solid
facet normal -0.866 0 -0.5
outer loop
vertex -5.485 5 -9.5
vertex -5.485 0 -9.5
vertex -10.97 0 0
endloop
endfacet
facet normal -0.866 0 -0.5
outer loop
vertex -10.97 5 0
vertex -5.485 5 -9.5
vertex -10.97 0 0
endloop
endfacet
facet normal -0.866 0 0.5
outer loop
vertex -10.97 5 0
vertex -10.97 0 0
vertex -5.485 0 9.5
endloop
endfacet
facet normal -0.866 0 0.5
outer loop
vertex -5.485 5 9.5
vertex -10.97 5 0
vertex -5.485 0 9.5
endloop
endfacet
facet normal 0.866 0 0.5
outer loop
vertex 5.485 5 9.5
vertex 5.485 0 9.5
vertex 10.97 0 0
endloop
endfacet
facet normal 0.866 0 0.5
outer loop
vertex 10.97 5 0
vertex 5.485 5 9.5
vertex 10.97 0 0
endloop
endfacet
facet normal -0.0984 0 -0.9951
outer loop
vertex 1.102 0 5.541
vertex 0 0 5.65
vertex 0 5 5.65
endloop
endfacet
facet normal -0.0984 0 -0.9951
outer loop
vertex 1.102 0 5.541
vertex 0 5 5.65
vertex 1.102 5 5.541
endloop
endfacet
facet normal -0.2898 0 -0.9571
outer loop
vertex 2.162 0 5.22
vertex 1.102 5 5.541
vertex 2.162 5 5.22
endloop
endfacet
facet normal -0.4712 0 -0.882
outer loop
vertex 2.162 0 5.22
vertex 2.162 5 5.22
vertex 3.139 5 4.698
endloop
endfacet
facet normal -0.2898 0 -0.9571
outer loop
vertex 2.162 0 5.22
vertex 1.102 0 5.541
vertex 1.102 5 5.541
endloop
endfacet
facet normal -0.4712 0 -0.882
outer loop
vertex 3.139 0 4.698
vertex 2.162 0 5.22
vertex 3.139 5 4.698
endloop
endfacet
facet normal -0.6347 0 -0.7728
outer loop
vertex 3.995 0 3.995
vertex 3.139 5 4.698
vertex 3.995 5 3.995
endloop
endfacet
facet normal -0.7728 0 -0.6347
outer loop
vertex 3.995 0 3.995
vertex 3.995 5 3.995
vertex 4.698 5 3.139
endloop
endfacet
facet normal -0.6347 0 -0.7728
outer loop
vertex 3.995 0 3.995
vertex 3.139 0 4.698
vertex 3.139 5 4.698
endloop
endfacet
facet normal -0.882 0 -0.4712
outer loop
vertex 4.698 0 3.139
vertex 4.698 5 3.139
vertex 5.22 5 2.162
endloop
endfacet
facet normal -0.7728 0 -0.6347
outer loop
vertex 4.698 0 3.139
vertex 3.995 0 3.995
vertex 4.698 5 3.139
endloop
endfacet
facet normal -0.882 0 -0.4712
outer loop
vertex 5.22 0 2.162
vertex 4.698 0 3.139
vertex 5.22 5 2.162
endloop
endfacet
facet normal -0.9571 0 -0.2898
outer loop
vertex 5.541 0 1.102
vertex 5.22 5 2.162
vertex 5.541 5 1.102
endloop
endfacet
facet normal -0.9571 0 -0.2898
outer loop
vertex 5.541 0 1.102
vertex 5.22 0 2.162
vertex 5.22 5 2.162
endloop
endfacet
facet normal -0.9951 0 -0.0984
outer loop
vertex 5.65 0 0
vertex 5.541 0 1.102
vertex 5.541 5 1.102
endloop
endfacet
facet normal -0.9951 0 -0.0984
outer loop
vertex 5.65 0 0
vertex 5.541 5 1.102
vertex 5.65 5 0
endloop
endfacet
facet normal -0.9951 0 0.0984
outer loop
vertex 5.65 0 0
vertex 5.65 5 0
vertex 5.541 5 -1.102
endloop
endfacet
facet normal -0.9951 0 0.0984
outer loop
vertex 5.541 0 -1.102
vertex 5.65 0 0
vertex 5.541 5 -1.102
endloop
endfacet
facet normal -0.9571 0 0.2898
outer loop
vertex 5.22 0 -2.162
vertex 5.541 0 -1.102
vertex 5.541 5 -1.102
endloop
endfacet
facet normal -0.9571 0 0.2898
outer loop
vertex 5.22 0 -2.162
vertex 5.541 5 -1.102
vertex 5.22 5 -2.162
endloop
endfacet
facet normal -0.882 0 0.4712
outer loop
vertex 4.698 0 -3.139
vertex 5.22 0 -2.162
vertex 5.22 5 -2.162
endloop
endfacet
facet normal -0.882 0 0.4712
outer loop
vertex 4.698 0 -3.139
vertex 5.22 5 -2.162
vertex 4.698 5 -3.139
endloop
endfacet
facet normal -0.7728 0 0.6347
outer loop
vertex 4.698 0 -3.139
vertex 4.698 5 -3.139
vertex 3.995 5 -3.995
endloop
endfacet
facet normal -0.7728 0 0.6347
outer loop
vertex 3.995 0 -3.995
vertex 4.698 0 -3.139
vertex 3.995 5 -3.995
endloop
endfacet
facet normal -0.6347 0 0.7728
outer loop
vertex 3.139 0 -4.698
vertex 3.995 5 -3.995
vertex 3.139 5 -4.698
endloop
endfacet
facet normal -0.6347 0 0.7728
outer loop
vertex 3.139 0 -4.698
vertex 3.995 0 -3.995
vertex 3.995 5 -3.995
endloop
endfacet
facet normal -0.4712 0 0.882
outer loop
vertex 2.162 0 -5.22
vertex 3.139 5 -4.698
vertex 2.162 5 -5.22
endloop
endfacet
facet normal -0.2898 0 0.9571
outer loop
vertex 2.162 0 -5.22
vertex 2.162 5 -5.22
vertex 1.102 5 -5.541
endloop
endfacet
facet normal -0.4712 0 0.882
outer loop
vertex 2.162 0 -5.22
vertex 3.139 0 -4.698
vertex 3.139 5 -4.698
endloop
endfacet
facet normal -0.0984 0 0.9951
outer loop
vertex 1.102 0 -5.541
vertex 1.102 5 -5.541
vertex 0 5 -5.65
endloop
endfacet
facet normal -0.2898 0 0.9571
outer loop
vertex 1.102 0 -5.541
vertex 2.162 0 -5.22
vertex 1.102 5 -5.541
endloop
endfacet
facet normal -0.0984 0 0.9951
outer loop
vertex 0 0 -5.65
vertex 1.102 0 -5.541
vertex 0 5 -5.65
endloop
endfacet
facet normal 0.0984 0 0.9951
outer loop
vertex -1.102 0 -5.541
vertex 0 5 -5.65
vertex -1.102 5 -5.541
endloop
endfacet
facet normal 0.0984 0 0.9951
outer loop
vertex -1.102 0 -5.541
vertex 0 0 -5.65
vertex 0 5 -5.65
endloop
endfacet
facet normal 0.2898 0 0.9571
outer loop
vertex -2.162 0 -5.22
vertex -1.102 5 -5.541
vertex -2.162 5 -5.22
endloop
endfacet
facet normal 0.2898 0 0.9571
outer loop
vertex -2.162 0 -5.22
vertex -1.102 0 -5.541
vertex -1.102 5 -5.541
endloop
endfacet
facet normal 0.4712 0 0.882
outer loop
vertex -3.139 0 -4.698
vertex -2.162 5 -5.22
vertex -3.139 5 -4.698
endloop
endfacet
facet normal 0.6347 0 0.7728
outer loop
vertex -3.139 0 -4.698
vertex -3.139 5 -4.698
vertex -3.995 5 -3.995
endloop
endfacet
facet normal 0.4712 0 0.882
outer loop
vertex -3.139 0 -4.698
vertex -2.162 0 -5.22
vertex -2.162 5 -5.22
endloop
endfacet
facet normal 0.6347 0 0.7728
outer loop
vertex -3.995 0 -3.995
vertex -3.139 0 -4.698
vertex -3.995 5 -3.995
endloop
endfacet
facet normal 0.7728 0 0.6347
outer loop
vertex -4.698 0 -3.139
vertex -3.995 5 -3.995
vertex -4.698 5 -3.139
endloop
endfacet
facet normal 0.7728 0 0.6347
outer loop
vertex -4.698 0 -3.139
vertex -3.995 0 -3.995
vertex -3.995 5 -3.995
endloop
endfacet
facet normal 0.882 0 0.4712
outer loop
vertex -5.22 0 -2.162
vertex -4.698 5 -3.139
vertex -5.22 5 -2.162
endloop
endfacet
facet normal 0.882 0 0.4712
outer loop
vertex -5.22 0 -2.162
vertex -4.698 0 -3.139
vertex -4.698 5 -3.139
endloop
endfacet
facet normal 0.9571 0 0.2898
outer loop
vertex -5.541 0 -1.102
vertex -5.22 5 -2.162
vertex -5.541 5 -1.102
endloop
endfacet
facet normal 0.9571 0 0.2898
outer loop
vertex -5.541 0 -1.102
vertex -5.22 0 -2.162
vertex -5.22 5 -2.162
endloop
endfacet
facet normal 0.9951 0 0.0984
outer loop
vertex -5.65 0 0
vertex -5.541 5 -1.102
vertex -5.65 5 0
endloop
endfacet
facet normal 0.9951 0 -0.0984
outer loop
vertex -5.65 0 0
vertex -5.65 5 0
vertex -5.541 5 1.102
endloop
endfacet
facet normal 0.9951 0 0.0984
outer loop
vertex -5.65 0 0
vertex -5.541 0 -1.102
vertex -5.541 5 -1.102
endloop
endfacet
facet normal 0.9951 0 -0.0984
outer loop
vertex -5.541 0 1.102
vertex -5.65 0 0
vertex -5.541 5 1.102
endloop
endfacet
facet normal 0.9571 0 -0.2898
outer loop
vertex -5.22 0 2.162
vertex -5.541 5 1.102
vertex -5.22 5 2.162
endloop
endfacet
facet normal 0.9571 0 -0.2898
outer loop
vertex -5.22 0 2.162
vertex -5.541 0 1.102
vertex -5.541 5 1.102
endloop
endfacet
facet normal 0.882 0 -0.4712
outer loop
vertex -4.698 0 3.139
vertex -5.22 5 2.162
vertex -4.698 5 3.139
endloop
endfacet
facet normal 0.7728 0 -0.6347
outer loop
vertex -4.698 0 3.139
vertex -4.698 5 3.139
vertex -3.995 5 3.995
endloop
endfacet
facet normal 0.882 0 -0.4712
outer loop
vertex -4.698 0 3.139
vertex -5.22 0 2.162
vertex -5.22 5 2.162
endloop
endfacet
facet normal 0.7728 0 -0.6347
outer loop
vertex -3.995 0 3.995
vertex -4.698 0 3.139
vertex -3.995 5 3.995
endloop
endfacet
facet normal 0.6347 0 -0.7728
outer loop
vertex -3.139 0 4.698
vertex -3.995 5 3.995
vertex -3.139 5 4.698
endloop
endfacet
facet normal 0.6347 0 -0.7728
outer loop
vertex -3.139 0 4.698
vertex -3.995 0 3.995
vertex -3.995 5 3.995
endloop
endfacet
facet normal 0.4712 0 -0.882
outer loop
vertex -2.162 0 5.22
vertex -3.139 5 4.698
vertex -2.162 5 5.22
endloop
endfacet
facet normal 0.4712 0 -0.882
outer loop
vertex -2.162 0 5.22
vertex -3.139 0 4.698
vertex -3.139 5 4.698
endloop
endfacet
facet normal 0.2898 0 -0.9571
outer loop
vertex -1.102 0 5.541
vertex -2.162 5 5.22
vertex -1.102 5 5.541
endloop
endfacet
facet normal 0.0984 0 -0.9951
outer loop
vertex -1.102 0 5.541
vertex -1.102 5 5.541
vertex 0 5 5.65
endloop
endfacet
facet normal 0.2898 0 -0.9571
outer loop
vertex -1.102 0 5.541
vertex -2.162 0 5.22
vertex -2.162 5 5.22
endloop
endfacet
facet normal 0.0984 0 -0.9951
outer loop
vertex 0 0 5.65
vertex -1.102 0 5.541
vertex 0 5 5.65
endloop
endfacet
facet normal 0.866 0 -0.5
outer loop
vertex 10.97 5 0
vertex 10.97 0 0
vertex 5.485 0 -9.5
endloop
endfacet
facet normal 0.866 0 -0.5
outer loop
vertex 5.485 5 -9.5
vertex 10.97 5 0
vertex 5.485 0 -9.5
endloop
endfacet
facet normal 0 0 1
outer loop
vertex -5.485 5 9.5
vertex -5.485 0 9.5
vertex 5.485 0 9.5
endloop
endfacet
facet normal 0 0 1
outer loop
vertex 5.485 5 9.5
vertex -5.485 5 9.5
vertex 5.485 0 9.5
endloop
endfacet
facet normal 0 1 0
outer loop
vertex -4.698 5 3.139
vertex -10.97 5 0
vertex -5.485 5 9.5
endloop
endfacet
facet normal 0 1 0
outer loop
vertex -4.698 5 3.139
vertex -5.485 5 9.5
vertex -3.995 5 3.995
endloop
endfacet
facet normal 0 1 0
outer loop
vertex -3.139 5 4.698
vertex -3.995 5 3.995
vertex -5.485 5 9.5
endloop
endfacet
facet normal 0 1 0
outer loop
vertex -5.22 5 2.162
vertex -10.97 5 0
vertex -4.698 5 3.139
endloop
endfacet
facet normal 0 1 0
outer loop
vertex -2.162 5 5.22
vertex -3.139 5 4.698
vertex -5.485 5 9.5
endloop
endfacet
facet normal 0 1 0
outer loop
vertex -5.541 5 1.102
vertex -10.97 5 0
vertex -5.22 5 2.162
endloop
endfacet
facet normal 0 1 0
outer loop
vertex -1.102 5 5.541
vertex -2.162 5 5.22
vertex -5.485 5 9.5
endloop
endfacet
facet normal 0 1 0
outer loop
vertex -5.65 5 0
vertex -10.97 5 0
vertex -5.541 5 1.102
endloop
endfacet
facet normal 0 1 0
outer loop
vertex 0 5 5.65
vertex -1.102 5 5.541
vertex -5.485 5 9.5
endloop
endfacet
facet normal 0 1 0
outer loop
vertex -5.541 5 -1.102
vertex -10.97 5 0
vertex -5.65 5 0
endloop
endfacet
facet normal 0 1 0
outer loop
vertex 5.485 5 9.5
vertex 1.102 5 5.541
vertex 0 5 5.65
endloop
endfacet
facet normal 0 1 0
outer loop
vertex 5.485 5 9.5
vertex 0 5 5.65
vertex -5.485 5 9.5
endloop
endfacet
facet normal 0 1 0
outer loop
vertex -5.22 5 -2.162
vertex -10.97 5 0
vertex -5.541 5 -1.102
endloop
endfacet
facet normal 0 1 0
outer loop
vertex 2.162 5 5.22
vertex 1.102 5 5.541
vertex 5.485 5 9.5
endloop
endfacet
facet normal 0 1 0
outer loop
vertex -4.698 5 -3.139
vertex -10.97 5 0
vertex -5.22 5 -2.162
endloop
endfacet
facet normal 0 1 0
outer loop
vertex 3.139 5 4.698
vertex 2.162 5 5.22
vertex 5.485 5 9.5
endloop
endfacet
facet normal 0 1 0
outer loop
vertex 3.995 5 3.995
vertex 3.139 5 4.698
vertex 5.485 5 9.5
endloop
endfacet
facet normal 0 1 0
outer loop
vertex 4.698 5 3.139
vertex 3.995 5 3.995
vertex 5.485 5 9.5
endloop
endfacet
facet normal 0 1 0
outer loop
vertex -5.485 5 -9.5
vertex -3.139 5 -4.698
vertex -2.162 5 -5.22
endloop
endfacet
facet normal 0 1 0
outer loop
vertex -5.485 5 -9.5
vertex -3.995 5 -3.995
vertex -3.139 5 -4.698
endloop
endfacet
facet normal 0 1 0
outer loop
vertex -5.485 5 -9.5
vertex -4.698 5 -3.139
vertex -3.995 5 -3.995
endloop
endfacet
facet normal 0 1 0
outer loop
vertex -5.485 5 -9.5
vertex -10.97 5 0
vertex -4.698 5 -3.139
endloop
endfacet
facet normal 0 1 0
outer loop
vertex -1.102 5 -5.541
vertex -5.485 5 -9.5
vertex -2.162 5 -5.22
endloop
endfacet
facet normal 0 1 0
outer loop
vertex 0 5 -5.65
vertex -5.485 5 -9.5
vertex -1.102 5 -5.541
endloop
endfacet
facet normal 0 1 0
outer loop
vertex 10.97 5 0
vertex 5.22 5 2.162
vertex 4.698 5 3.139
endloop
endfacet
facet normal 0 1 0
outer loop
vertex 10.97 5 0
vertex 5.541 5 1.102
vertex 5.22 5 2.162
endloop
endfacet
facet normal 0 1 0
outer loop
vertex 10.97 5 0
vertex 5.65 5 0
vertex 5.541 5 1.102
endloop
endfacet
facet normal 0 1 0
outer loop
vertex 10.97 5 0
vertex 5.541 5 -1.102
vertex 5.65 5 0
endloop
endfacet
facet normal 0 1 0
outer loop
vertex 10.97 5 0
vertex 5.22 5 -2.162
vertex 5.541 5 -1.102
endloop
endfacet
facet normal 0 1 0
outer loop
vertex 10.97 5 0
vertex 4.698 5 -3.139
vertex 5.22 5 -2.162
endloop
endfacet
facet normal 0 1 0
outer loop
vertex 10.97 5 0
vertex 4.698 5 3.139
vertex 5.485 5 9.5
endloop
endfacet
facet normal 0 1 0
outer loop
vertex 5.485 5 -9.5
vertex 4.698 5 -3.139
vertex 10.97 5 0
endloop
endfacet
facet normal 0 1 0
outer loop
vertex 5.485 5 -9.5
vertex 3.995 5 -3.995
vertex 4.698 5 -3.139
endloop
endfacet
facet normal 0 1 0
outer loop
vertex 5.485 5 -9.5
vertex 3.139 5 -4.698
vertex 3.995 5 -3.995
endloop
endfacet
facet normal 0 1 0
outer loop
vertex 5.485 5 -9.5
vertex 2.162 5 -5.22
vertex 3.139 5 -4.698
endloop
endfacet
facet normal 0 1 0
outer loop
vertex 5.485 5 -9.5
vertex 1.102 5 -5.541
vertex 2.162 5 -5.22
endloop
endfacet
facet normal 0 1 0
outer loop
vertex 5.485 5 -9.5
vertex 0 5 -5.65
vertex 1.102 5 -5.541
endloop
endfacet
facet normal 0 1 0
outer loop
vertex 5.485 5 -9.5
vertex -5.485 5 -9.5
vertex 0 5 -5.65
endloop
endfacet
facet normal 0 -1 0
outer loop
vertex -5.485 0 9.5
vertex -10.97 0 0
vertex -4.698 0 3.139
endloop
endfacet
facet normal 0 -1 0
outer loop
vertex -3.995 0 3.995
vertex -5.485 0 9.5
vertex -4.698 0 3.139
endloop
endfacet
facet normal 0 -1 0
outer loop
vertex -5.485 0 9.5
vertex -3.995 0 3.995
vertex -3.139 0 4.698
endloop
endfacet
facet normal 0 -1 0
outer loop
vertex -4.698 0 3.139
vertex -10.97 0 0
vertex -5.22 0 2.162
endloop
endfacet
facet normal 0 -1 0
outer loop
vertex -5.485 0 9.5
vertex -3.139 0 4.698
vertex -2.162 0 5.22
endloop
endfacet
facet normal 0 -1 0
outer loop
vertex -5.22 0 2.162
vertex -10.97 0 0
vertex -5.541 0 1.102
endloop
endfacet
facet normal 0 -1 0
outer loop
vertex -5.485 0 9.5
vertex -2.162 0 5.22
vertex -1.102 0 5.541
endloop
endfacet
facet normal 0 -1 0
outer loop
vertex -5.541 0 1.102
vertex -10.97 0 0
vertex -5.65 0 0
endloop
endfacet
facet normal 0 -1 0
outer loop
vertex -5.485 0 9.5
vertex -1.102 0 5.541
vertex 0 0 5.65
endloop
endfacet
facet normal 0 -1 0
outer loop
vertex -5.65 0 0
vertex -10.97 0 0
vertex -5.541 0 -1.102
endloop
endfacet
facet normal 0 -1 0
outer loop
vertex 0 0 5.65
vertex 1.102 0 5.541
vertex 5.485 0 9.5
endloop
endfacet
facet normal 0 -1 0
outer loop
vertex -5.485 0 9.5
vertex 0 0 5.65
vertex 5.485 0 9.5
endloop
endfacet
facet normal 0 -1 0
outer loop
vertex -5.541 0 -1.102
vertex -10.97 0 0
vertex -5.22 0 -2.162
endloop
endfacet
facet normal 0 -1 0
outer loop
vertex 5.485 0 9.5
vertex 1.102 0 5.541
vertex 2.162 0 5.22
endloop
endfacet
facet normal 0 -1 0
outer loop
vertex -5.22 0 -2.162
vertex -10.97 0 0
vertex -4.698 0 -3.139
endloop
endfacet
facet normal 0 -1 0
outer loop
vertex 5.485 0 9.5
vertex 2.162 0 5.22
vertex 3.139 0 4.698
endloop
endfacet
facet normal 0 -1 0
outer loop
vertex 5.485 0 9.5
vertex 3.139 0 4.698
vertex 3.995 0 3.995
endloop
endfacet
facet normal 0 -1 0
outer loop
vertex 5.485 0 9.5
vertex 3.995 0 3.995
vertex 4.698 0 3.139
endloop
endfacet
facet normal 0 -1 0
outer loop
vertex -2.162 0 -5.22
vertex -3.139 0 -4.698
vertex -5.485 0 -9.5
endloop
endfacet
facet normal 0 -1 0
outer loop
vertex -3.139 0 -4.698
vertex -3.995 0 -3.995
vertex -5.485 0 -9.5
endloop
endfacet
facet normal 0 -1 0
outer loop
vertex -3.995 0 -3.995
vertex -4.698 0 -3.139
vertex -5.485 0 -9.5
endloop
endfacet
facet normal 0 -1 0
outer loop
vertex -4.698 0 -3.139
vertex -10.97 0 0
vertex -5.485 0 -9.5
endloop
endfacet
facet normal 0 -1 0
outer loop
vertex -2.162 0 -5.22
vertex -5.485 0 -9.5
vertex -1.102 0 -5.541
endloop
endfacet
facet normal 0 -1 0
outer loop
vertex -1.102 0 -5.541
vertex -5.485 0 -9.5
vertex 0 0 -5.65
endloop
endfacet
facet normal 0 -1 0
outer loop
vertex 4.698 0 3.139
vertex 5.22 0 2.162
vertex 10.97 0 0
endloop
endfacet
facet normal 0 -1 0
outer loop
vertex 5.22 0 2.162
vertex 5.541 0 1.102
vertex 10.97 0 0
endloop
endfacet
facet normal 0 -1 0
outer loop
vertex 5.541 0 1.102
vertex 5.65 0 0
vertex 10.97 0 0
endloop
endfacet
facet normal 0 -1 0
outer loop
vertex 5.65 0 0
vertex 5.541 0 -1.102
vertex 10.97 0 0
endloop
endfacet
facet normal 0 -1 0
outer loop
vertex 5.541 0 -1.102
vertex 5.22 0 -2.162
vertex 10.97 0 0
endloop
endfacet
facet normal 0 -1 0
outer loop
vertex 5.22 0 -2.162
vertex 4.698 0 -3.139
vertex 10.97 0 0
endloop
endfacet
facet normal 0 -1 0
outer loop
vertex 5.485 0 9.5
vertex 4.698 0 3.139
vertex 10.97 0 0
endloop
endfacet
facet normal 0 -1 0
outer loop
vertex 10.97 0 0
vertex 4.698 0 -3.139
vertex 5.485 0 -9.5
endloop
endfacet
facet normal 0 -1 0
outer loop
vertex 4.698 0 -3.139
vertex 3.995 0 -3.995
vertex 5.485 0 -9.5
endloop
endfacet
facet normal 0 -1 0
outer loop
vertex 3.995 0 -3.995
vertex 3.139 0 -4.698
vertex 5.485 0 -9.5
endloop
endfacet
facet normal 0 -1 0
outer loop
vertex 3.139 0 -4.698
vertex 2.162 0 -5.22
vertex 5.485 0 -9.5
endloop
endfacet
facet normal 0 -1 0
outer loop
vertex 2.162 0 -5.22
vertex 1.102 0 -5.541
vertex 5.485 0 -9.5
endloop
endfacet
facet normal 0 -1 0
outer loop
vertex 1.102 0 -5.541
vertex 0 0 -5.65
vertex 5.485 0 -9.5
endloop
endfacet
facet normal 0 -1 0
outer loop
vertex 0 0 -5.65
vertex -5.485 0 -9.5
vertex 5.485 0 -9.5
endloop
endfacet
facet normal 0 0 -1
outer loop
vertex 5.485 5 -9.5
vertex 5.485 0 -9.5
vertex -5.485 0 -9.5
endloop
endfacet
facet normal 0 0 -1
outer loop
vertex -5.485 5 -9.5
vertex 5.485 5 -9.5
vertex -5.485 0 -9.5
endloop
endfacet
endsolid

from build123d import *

# Parameters (mm, degrees)
ESQUISSE1_R      = 5.65
EXTRUSION1_DEPTH = 5


with BuildPart() as part:
    # Esquisse1 → Extrusion1 (new body)
    with BuildSketch(Plane(origin=(0, 0, 0), x_dir=(1, 0, 0), z_dir=(0, 1, 0))):
        Polygon((5.484827557, -9.5), (10.969655115, 0), (5.484827557, 9.5), (-5.484827557, 9.5), (-10.969655115, 0), (-5.484827557, -9.5), align=None)
        with Locations(Location((0, 0, 0), (0, 0, 270))):
            Circle(ESQUISSE1_R, mode=Mode.SUBTRACT)
    extrude(amount=EXTRUSION1_DEPTH)


solid = part.part
